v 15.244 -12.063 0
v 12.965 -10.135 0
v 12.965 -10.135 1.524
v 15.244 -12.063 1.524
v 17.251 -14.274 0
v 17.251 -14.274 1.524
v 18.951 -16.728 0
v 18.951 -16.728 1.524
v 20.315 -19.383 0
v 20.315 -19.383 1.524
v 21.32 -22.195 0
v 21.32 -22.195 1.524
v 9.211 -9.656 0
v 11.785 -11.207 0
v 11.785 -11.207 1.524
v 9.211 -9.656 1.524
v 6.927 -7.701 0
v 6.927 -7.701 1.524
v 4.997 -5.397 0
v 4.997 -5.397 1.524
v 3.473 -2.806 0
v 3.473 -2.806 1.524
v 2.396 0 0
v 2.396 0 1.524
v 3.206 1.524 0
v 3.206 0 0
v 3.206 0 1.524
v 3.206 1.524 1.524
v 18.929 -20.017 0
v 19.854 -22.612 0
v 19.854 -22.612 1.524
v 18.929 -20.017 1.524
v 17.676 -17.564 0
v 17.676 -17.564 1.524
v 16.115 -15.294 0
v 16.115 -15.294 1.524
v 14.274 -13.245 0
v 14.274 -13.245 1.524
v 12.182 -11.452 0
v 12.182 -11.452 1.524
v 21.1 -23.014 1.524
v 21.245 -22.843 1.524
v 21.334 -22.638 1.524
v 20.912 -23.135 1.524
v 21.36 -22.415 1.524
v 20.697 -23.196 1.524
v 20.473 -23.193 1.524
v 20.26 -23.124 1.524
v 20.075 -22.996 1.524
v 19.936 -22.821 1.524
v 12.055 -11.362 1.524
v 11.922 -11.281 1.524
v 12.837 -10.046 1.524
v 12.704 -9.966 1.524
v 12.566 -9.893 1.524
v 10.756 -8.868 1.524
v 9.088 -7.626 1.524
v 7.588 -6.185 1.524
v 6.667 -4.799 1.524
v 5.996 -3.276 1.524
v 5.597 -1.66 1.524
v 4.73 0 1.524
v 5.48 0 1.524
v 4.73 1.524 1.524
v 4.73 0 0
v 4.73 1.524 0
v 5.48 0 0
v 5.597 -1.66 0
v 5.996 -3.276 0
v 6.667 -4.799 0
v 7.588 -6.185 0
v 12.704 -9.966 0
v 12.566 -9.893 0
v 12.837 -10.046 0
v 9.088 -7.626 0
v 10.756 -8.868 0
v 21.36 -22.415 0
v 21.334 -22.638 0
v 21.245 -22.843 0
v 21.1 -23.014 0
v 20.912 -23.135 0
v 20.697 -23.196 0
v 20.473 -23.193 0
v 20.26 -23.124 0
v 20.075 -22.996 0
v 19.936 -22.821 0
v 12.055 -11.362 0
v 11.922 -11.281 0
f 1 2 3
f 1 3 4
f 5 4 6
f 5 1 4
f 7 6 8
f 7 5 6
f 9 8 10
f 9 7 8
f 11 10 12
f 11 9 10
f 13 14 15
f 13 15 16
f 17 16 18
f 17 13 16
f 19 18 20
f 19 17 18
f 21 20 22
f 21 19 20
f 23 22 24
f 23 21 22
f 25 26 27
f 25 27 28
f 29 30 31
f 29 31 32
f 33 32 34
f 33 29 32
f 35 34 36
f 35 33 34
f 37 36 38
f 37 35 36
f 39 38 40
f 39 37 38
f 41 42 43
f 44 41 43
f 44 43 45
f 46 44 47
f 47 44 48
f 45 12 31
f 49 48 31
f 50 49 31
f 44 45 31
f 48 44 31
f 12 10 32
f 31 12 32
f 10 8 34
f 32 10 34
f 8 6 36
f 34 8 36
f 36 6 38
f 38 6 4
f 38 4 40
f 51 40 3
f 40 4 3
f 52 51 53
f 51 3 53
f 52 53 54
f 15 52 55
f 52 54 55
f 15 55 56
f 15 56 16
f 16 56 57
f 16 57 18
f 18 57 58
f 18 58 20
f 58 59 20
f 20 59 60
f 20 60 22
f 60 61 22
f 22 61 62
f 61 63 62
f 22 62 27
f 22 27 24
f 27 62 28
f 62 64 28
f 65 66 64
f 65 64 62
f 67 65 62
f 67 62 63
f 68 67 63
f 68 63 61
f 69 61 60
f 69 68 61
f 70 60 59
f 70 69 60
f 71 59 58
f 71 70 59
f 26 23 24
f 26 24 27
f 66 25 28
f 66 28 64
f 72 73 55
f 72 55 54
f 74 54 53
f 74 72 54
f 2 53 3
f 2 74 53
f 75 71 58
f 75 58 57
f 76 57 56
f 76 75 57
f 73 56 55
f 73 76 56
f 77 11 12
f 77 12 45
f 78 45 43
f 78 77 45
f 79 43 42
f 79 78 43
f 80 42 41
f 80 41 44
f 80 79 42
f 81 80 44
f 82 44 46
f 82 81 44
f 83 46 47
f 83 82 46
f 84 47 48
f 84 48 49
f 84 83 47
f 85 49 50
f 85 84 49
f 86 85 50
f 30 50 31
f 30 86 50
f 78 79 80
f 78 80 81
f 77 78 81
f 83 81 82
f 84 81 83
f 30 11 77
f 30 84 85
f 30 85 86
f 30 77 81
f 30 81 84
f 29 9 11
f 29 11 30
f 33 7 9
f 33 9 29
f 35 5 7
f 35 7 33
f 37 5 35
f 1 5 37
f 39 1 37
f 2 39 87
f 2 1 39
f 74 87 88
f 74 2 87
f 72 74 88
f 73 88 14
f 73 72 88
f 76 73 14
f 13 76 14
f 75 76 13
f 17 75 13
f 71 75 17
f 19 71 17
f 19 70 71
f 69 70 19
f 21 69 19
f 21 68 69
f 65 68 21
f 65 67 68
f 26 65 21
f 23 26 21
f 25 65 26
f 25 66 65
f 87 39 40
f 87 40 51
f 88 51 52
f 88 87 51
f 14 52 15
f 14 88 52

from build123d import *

# Parameters (mm, degrees)
BOSS_EXTRUDE1_DEPTH = 1.524


with BuildPart() as part:
    # Sketch1 → Boss-Extrude1 (new body)
    with BuildSketch(Plane.XY):
        with BuildLine():
            ThreePointArc((12.566304874, -9.8933052), (12.77131161, -10.004957793), (12.965201909, -10.13496016))
            ThreePointArc((12.965201909, -10.13496016), (18.14143902, -15.472865183), (21.320013307, -22.194719552))
            ThreePointArc((21.320013307, -22.194719552), (20.806583347, -23.173609324), (19.854339012, -22.612301713))
            ThreePointArc((19.854339012, -22.612301713), (16.93227249, -16.403886417), (12.182265789, -11.452085777))
            ThreePointArc((12.182265789, -11.452085777), (11.989118214, -11.3205608), (11.784700698, -11.207342939))
            ThreePointArc((11.784700698, -11.207342939), (5.914450191, -6.588756496), (2.396003148, 0))
            Line((2.396003148, 0), (3.20554689, 0))
            Line((3.20554689, 0), (3.20554689, 1.524))
            Line((3.20554689, 1.524), (4.72954689, 1.524))
            Line((4.72954689, 1.524), (4.72954689, 0))
            Line((4.72954689, 0), (5.480406076, 0))
            ThreePointArc((5.480406076, 0), (5.996385034, -3.275905029), (7.587657532, -6.185482298))
            ThreePointArc((7.587657532, -6.185482298), (9.902770623, -8.273313508), (12.566304874, -9.8933052))
        make_face()
    extrude(amount=BOSS_EXTRUDE1_DEPTH)


solid = part.part
